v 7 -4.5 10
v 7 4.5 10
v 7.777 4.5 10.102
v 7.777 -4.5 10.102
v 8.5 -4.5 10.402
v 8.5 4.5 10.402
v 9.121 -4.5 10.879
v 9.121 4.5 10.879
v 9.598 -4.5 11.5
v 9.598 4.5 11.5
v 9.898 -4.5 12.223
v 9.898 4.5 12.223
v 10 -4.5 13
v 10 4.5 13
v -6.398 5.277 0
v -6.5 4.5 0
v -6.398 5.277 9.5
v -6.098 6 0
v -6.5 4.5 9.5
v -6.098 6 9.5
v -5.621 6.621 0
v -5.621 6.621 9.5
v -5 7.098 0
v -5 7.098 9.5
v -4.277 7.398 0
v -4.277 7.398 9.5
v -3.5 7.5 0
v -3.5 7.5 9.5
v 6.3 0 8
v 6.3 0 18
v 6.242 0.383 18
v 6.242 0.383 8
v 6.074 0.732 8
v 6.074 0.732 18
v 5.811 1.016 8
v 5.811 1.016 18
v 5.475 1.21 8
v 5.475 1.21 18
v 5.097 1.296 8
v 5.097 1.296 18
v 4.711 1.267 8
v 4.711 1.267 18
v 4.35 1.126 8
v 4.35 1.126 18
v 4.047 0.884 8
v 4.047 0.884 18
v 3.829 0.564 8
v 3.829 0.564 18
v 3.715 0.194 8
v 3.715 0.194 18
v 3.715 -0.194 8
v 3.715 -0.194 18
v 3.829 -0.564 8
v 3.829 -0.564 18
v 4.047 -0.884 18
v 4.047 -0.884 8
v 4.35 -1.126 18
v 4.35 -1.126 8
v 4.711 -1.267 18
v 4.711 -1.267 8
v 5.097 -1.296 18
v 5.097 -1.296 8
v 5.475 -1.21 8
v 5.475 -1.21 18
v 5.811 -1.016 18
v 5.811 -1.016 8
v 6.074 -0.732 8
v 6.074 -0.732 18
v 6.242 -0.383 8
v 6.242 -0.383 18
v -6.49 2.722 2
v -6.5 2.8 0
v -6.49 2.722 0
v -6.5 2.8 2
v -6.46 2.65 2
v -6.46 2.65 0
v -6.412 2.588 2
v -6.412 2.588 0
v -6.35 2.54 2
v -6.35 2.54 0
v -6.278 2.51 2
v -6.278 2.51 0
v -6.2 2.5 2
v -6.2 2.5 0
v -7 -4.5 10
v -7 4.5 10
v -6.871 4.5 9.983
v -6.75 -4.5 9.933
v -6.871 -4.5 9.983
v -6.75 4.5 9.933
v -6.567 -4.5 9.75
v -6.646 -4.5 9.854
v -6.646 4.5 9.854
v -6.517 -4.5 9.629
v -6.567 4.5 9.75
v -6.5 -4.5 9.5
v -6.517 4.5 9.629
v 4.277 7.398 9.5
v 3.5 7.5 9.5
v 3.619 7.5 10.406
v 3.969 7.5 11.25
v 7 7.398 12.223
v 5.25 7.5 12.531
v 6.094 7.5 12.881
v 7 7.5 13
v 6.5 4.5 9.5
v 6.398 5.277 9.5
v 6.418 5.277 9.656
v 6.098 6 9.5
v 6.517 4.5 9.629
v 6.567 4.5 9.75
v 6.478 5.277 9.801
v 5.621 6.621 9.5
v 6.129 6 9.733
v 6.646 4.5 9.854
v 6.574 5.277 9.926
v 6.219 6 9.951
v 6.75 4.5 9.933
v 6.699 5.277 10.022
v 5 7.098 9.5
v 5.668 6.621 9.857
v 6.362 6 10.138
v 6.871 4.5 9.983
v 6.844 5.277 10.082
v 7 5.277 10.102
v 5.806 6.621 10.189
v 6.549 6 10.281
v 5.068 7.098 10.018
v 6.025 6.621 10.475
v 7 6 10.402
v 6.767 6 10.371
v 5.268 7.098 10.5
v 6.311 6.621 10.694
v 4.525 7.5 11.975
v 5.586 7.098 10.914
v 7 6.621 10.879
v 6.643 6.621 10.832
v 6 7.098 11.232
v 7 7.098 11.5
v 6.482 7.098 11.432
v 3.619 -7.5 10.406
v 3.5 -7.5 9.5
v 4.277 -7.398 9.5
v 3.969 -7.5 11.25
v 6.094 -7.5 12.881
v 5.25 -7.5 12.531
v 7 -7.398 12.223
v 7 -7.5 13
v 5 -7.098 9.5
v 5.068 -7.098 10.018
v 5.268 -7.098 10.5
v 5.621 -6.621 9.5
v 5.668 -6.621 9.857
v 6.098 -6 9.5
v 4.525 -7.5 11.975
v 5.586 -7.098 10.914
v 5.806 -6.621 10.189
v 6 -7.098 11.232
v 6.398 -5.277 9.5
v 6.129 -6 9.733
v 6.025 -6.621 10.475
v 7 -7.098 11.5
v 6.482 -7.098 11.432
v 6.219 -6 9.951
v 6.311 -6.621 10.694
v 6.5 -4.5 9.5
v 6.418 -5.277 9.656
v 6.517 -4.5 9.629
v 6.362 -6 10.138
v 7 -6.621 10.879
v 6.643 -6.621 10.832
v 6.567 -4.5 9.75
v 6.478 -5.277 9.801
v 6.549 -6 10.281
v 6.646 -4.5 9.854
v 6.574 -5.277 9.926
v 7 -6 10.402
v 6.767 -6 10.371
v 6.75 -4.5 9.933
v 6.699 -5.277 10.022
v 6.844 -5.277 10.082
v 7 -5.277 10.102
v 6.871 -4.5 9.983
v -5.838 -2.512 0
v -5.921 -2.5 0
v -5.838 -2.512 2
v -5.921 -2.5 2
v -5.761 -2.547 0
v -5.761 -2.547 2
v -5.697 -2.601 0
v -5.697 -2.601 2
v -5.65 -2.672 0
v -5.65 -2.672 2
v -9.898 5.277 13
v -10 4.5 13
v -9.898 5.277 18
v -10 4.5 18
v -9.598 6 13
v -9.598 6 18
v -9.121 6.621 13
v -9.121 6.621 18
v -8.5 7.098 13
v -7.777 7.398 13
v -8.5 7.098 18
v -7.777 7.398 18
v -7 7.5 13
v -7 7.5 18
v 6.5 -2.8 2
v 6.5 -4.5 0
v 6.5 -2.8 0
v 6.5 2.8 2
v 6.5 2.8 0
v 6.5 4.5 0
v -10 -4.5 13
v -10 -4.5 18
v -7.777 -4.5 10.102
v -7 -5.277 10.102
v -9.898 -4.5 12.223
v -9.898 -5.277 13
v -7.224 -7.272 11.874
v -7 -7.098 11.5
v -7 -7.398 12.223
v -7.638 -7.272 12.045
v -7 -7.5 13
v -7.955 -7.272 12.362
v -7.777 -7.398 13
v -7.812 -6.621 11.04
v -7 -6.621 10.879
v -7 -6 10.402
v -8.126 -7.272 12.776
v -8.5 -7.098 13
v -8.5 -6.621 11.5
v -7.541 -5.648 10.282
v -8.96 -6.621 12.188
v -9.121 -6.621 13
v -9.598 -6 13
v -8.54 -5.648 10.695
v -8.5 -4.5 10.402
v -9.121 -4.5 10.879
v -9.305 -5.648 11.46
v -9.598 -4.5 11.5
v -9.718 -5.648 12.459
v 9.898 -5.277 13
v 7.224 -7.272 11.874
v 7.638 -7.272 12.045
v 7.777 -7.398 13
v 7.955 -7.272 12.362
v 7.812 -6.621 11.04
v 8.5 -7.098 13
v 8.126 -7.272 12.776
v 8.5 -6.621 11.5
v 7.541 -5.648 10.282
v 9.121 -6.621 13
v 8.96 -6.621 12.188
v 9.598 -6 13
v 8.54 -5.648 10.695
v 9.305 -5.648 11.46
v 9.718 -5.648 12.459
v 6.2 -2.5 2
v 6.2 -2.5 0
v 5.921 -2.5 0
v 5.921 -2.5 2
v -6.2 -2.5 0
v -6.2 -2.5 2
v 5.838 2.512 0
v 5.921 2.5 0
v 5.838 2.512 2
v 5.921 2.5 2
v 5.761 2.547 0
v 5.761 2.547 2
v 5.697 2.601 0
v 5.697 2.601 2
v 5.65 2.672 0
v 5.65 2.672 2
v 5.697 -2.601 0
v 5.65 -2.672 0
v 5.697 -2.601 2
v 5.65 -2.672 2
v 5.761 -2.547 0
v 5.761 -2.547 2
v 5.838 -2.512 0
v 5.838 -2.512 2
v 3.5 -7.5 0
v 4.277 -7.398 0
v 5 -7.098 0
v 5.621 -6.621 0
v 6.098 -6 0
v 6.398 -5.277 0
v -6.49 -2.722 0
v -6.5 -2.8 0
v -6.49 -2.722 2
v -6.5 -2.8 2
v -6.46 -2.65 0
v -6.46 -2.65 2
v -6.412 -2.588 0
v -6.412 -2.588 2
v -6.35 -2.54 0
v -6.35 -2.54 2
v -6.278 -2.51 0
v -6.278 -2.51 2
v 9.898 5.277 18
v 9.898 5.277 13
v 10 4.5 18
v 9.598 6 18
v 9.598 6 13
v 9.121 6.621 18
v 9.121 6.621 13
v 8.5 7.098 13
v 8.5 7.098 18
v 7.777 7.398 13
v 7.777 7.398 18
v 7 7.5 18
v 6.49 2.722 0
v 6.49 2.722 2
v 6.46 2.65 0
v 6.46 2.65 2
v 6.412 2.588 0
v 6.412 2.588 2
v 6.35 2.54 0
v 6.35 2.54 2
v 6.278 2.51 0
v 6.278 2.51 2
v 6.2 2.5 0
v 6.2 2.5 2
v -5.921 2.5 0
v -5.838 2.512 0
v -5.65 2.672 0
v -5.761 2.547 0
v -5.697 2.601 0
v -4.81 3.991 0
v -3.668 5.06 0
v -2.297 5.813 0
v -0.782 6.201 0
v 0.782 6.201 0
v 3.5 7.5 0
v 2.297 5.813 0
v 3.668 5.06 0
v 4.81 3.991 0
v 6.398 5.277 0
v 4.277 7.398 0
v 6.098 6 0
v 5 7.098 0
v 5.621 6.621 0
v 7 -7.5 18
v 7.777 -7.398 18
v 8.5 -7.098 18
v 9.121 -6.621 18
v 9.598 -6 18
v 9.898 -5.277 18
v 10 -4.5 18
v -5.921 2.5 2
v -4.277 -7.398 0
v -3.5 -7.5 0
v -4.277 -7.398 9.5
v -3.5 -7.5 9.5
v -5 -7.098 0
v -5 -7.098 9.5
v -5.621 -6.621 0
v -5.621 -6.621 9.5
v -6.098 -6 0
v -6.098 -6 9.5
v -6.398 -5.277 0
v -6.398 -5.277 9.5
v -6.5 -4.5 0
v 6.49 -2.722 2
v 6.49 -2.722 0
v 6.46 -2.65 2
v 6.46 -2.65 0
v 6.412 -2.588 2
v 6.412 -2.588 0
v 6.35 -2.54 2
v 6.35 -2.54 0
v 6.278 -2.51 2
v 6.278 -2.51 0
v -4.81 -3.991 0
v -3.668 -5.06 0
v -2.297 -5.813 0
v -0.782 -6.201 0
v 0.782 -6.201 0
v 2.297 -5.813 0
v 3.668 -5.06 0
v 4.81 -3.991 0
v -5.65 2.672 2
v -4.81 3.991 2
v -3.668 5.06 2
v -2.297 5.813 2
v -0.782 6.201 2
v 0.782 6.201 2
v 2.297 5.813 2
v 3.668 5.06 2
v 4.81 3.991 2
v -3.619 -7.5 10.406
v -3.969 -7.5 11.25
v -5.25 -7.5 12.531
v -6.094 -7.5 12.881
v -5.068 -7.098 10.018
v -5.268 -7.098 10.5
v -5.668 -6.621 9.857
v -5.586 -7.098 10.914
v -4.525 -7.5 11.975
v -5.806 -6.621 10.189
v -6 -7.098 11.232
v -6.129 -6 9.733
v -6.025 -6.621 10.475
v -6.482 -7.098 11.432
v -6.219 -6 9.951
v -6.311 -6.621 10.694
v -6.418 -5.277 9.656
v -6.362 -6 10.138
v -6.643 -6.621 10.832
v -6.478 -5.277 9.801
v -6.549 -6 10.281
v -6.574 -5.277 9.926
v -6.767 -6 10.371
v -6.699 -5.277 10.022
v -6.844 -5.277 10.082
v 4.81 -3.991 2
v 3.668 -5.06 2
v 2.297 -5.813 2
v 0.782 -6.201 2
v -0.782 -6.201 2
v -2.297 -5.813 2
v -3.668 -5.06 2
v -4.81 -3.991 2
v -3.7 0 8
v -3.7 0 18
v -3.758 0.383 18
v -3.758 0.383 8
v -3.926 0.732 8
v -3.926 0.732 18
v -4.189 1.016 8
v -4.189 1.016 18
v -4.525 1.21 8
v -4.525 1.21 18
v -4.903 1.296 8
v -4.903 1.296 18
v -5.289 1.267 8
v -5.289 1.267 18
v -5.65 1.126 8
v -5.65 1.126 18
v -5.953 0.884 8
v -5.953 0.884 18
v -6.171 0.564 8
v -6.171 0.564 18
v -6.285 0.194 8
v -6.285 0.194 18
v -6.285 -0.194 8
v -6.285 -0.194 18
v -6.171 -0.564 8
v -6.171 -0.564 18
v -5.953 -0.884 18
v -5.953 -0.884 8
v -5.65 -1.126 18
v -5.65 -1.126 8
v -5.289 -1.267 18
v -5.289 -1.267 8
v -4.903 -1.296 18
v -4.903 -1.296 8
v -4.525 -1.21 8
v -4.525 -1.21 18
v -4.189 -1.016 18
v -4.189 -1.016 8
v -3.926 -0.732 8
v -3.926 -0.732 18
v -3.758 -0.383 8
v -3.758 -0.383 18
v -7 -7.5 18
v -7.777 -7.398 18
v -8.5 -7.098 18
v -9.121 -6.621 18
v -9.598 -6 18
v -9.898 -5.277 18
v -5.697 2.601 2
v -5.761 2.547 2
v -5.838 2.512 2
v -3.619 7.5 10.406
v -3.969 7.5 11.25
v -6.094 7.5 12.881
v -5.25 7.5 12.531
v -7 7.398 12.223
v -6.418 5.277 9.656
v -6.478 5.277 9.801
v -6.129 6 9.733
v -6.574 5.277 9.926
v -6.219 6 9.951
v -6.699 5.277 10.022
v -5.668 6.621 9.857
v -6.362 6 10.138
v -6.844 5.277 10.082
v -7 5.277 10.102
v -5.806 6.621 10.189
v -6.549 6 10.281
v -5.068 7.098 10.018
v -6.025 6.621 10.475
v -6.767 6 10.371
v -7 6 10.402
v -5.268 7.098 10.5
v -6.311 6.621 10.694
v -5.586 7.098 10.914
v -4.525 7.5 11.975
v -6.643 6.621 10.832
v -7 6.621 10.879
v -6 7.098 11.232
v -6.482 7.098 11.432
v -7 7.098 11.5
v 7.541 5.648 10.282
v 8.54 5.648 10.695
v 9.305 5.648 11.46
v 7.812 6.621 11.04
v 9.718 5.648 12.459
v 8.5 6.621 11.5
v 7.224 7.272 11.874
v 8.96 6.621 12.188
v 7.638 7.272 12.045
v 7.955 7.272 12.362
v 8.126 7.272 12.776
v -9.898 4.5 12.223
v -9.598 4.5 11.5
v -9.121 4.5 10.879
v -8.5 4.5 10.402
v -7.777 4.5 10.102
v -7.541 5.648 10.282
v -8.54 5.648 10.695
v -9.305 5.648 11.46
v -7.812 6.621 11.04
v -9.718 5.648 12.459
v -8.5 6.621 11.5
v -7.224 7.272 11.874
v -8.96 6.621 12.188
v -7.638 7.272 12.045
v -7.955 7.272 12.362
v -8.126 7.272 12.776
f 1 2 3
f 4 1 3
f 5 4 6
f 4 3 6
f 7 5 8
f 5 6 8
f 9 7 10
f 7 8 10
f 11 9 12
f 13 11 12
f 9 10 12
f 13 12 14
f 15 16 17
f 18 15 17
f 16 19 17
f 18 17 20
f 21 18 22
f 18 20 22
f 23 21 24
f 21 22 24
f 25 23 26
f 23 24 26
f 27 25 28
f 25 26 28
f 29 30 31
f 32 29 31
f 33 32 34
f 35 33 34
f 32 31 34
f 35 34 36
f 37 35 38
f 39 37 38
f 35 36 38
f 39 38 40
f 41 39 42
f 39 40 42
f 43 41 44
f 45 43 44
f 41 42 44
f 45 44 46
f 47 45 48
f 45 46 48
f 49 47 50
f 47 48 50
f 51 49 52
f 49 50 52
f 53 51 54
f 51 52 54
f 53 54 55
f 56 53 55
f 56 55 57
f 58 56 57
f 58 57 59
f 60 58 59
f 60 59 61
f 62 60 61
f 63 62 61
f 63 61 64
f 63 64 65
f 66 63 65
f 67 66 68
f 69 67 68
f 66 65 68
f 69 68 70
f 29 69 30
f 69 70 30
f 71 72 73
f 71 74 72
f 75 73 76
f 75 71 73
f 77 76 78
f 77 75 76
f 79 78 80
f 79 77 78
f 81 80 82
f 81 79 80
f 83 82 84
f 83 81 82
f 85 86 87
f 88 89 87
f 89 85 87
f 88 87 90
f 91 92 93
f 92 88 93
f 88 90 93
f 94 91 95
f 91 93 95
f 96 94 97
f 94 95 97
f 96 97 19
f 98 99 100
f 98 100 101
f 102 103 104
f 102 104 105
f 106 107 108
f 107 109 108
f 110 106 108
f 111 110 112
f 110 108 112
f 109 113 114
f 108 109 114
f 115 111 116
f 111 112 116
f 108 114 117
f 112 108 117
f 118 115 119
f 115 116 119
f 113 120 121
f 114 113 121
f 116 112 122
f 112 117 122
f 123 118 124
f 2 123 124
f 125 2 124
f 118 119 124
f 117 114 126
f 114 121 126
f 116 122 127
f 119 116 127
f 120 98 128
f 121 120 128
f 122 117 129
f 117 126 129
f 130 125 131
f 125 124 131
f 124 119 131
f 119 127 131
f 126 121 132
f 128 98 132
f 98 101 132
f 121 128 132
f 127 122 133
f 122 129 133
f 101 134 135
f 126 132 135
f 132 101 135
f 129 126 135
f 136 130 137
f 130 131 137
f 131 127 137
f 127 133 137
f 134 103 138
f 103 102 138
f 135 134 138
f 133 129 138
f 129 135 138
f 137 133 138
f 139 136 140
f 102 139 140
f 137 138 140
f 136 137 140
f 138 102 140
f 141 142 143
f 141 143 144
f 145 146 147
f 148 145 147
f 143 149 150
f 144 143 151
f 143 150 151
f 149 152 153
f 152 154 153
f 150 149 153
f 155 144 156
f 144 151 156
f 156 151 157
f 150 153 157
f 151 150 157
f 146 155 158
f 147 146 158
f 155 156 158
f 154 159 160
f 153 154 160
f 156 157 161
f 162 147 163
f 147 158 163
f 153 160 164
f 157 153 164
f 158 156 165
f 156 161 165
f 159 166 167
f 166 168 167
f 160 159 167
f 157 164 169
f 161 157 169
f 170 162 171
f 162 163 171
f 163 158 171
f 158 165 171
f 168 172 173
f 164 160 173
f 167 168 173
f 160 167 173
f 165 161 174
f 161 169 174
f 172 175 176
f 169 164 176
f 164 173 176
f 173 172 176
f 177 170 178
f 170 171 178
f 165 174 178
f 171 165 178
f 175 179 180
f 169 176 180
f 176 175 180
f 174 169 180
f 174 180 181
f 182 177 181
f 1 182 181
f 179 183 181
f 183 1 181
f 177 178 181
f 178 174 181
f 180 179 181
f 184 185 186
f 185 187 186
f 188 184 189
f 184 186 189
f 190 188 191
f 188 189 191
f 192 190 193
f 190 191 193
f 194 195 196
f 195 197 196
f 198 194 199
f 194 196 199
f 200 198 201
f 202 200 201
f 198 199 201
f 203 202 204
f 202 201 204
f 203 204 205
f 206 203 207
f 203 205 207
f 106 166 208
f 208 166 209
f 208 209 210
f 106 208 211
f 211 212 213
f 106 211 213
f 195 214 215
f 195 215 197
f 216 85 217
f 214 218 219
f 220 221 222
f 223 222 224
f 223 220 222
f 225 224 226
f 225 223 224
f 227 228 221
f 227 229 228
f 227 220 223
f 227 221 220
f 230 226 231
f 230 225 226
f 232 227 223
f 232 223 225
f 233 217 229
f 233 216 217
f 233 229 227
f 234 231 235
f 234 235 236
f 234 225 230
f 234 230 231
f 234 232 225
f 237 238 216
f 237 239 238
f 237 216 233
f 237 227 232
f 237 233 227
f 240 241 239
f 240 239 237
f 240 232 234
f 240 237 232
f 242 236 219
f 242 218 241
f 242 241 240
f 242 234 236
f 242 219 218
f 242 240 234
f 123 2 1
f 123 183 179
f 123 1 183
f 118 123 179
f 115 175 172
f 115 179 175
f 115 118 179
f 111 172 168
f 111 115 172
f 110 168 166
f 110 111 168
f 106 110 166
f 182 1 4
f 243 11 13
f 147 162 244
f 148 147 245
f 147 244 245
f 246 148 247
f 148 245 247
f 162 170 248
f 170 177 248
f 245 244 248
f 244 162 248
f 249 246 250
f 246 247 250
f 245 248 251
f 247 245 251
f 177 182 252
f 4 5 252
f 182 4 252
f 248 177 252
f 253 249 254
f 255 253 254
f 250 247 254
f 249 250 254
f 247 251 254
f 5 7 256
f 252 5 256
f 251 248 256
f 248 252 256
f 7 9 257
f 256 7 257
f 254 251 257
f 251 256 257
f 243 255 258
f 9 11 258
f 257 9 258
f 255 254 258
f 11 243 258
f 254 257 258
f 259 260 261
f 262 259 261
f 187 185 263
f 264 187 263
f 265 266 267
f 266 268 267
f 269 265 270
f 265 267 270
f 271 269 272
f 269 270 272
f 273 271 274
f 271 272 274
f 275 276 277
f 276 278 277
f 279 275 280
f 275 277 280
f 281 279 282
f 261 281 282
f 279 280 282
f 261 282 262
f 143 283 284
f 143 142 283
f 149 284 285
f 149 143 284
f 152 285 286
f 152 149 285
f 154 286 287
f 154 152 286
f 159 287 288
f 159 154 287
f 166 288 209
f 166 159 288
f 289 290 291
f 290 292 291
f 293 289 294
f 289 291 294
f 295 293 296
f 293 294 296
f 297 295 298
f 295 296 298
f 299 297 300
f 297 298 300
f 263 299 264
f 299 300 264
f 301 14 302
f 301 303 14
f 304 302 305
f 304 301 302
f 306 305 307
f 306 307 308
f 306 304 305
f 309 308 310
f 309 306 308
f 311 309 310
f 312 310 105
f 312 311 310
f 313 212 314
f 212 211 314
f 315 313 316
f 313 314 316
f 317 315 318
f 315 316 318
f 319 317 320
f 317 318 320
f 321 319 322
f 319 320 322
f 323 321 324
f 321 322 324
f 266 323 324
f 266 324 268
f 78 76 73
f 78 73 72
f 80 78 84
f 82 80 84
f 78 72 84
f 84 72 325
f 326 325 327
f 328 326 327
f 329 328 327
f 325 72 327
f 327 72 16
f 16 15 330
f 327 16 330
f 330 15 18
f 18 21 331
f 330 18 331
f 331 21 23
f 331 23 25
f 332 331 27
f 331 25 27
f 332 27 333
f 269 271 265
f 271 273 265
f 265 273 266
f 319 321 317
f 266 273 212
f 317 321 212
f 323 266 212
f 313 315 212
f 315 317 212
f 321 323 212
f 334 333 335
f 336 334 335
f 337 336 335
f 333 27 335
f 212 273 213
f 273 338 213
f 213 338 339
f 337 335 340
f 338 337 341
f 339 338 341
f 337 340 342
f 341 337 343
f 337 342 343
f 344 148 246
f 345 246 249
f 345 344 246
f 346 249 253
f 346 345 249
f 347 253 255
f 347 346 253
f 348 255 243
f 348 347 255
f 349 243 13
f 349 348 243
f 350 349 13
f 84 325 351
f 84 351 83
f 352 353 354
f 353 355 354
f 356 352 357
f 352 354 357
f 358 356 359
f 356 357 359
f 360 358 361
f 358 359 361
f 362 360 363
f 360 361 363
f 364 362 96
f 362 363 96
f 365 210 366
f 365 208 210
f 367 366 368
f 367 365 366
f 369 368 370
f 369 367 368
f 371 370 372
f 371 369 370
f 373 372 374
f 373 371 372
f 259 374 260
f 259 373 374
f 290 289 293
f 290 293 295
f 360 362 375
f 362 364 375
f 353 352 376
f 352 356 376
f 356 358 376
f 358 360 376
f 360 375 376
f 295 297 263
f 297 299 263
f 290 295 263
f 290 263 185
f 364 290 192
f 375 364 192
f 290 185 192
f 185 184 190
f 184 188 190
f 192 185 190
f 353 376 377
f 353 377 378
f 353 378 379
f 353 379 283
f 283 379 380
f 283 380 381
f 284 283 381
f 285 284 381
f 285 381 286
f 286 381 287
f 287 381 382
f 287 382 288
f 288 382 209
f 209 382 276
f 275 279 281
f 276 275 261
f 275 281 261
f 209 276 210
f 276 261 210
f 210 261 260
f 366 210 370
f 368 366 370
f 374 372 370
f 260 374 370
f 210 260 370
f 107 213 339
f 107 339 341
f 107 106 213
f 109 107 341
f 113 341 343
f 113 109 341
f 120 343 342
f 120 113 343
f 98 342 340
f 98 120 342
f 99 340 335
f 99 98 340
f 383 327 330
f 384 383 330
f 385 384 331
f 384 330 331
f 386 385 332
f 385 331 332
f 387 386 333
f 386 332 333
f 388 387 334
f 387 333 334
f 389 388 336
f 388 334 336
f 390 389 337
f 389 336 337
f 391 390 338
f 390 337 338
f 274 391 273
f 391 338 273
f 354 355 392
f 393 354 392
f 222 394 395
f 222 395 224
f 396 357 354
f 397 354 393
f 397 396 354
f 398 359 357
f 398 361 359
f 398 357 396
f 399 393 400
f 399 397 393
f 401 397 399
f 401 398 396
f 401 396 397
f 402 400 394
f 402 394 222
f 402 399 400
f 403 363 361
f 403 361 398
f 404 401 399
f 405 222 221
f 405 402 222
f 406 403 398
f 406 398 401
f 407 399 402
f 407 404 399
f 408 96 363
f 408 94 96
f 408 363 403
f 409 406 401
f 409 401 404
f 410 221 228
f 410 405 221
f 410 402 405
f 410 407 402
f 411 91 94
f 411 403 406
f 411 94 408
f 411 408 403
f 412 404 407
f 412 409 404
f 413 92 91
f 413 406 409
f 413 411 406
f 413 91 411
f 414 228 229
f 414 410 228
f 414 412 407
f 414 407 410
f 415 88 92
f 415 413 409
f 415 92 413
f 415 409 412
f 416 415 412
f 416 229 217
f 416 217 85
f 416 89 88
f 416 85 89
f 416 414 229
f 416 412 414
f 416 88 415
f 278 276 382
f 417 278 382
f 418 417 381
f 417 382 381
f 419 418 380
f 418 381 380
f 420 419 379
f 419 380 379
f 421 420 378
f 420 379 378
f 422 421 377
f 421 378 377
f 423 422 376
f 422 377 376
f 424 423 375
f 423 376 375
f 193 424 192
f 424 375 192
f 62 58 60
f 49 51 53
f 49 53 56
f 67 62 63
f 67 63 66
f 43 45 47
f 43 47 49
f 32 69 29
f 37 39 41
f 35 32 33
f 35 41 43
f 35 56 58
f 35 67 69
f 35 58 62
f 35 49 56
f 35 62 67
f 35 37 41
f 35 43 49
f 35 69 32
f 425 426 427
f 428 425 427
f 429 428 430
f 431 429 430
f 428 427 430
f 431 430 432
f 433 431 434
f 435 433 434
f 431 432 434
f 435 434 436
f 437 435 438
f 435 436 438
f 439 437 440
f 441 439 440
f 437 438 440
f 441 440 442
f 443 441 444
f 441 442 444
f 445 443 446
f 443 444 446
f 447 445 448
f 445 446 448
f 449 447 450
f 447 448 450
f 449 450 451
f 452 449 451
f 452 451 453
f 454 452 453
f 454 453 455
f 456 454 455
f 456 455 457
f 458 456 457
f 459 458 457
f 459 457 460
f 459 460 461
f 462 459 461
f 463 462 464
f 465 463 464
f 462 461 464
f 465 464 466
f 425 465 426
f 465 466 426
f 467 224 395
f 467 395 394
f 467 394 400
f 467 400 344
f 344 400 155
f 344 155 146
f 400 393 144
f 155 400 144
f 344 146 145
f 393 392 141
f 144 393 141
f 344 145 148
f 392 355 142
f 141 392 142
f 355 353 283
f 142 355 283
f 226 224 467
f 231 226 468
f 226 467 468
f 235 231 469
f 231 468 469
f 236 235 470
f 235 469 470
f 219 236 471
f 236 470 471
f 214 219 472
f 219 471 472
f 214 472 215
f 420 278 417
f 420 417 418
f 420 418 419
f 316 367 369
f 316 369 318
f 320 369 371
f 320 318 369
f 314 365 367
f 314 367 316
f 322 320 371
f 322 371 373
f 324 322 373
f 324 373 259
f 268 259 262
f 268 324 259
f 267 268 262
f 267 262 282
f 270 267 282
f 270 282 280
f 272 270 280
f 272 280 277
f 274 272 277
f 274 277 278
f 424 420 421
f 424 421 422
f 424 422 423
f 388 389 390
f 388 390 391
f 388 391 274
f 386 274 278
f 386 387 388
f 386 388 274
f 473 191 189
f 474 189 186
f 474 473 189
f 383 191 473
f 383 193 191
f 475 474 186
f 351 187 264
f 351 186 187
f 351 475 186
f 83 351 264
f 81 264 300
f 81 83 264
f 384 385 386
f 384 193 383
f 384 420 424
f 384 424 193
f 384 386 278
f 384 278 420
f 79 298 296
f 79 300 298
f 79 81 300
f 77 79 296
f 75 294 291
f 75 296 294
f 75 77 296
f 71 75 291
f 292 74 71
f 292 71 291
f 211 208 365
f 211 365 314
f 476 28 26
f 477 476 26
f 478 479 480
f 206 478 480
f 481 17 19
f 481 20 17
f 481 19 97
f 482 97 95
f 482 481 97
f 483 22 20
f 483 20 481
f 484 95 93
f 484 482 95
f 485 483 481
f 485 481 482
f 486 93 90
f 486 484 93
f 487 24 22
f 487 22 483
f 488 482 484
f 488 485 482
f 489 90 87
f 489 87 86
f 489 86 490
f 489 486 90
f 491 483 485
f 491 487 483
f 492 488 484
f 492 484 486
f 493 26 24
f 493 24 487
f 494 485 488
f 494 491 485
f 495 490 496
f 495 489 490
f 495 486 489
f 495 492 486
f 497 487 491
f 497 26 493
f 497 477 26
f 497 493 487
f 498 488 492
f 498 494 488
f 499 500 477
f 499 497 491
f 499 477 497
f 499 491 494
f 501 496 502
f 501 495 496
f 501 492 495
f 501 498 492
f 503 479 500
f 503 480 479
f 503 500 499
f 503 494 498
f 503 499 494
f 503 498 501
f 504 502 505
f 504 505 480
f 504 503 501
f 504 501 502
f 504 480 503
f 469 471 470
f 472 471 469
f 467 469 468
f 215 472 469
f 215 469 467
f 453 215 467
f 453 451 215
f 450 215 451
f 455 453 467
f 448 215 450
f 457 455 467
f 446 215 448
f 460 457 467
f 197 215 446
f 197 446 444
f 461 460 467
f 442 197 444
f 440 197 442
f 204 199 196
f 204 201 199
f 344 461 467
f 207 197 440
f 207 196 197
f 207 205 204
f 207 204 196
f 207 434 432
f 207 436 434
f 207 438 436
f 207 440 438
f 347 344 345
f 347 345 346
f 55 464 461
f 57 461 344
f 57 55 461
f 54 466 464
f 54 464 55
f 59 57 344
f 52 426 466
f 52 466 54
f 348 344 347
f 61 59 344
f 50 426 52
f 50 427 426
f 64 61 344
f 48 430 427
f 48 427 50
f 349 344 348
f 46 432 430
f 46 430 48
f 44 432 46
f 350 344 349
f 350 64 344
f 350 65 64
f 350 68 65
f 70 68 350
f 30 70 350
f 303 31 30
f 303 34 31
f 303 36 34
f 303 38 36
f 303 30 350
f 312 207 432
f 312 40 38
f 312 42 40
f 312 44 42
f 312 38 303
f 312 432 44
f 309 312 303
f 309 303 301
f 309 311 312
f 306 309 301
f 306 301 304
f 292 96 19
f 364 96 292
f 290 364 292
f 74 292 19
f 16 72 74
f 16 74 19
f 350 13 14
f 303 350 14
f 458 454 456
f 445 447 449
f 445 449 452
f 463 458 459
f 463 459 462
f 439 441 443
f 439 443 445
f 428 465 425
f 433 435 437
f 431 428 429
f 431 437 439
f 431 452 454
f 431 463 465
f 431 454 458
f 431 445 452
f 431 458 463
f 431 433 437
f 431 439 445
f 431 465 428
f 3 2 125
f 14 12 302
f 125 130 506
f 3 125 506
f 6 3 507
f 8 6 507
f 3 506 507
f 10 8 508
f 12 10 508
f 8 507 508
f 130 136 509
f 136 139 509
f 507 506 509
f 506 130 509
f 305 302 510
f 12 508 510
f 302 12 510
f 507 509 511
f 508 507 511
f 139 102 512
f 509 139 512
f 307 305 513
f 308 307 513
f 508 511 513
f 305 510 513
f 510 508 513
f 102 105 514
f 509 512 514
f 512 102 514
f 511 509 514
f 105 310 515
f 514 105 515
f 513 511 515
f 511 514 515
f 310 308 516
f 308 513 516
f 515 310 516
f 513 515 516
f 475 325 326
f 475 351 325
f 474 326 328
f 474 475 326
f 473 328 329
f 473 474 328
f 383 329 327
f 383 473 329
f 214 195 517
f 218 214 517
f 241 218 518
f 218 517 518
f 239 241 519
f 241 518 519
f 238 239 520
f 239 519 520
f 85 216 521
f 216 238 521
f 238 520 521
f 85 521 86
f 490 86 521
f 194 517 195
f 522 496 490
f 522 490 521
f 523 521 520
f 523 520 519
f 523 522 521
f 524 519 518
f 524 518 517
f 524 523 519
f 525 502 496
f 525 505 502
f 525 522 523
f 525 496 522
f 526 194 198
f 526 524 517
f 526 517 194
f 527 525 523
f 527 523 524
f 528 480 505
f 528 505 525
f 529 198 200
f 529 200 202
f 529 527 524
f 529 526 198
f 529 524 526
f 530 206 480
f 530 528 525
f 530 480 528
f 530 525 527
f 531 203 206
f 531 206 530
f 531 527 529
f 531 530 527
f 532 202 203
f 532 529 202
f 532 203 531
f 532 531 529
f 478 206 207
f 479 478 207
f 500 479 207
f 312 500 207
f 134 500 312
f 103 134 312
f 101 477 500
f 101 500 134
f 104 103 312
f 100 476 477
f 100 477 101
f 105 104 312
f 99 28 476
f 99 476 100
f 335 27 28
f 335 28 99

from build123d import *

# Parameters (mm, degrees)
SKETCH_1_W          = 13
SKETCH_1_H          = 15
EXTRUDE_1_DEPTH     = 10
SKETCH_2_W          = 20
SKETCH_2_H          = 15
EXTRUDE_2_DEPTH     = 8
SKETCH_6_R          = 6.25
SKETCH_6_W          = 13
SKETCH_6_H          = 5
CUT_EXTRUDE_3_DEPTH = 2
SKETCH_8_R          = 1.3
CUT_EXTRUDE_5_DEPTH = 10
FILLET_7_R          = 0.5
FILLET_8_R          = 3
FILLET_9_R          = 3
FILLET_10_R         = 0.3


with BuildPart() as part:
    # ｽｹｯﾁ1 → ﾎﾞｽ - 押し出し1 (new body)
    with BuildSketch(Plane.XY):
        Rectangle(SKETCH_1_W, SKETCH_1_H)
    extrude(amount=EXTRUDE_1_DEPTH)

    # ｽｹｯﾁ2 → ﾎﾞｽ - 押し出し2 (add)
    with BuildSketch(Plane.XY.offset(10)):
        Rectangle(SKETCH_2_W, SKETCH_2_H)
    extrude(amount=EXTRUDE_2_DEPTH)

    # ｽｹｯﾁ6 → ｶｯﾄ - 押し出し3 (cut)
    with BuildSketch(Plane(origin=(0, 0, 0), x_dir=(-1, 0, 0), z_dir=(0, 0, -1))):
        Circle(SKETCH_6_R)
        Rectangle(SKETCH_6_W, SKETCH_6_H)
    extrude(amount=-CUT_EXTRUDE_3_DEPTH, mode=Mode.SUBTRACT)

    # ｽｹｯﾁ8 → ｶｯﾄ - 押し出し5 (cut)
    with BuildSketch(Plane.XY.offset(18)):
        with Locations((-5, 0)):
            Circle(SKETCH_8_R)
        with Locations((5, 0)):
            Circle(SKETCH_8_R)
    extrude(amount=-CUT_EXTRUDE_5_DEPTH, mode=Mode.SUBTRACT)

    # ﾌｨﾚｯﾄ7
    fillet_7_edges = [part.edges().sort_by_distance(p)[0] for p in [
        (6.5, 0, 10),
        (-6.5, 0, 10),
    ]]
    fillet(fillet_7_edges, radius=FILLET_7_R)

    # ﾌｨﾚｯﾄ8
    fillet_8_edges = [part.edges().sort_by_distance(p)[0] for p in [
        (10, 0, 10),
        (-10, 0, 10),
    ]]
    fillet(fillet_8_edges, radius=FILLET_8_R - 0.0001)  # a hair under: the kernel refuses the full size

    # ﾌｨﾚｯﾄ9
    fillet_9_edges = [part.edges().sort_by_distance(p)[0] for p in [
        (-10, 7.5, 15.49995),
        (-10, -7.5, 15.49995),
        (10, -7.5, 15.49995),
        (10, 7.5, 15.49995),
        (-6.5, -7.5, 4.75),
        (-6.5, 7.5, 4.75),
        (6.5, 7.5, 4.75),
        (6.5, -7.5, 4.75),
        (-6.646446609, -7.5, 9.853553391),
        (-6.646446609, 7.5, 9.853553391),
        (6.646446609, 7.5, 9.853553391),
        (6.646446609, -7.5, 9.853553391),
        (-9.121349633, 7.5, 10.878650367),
        (9.121349633, 7.5, 10.878650367),
        (-9.121349633, -7.5, 10.878650367),
        (9.121349633, -7.5, 10.878650367),
    ]]
    fillet(fillet_9_edges, radius=FILLET_9_R - 0.0001)  # a hair under: the kernel refuses the full size

    # ﾌｨﾚｯﾄ10
    fillet_10_edges = [part.edges().sort_by_distance(p)[0] for p in [
        (-6.5, 2.5, 1),
        (-5.728219619, 2.5, 1),
        (-6.5, -2.5, 1),
        (5.728219619, -2.5, 1),
        (-5.728219619, -2.5, 1),
        (6.5, -2.5, 1),
        (5.728219619, 2.5, 1),
        (6.5, 2.5, 1),
    ]]
    fillet(fillet_10_edges, radius=FILLET_10_R)


solid = part.part
